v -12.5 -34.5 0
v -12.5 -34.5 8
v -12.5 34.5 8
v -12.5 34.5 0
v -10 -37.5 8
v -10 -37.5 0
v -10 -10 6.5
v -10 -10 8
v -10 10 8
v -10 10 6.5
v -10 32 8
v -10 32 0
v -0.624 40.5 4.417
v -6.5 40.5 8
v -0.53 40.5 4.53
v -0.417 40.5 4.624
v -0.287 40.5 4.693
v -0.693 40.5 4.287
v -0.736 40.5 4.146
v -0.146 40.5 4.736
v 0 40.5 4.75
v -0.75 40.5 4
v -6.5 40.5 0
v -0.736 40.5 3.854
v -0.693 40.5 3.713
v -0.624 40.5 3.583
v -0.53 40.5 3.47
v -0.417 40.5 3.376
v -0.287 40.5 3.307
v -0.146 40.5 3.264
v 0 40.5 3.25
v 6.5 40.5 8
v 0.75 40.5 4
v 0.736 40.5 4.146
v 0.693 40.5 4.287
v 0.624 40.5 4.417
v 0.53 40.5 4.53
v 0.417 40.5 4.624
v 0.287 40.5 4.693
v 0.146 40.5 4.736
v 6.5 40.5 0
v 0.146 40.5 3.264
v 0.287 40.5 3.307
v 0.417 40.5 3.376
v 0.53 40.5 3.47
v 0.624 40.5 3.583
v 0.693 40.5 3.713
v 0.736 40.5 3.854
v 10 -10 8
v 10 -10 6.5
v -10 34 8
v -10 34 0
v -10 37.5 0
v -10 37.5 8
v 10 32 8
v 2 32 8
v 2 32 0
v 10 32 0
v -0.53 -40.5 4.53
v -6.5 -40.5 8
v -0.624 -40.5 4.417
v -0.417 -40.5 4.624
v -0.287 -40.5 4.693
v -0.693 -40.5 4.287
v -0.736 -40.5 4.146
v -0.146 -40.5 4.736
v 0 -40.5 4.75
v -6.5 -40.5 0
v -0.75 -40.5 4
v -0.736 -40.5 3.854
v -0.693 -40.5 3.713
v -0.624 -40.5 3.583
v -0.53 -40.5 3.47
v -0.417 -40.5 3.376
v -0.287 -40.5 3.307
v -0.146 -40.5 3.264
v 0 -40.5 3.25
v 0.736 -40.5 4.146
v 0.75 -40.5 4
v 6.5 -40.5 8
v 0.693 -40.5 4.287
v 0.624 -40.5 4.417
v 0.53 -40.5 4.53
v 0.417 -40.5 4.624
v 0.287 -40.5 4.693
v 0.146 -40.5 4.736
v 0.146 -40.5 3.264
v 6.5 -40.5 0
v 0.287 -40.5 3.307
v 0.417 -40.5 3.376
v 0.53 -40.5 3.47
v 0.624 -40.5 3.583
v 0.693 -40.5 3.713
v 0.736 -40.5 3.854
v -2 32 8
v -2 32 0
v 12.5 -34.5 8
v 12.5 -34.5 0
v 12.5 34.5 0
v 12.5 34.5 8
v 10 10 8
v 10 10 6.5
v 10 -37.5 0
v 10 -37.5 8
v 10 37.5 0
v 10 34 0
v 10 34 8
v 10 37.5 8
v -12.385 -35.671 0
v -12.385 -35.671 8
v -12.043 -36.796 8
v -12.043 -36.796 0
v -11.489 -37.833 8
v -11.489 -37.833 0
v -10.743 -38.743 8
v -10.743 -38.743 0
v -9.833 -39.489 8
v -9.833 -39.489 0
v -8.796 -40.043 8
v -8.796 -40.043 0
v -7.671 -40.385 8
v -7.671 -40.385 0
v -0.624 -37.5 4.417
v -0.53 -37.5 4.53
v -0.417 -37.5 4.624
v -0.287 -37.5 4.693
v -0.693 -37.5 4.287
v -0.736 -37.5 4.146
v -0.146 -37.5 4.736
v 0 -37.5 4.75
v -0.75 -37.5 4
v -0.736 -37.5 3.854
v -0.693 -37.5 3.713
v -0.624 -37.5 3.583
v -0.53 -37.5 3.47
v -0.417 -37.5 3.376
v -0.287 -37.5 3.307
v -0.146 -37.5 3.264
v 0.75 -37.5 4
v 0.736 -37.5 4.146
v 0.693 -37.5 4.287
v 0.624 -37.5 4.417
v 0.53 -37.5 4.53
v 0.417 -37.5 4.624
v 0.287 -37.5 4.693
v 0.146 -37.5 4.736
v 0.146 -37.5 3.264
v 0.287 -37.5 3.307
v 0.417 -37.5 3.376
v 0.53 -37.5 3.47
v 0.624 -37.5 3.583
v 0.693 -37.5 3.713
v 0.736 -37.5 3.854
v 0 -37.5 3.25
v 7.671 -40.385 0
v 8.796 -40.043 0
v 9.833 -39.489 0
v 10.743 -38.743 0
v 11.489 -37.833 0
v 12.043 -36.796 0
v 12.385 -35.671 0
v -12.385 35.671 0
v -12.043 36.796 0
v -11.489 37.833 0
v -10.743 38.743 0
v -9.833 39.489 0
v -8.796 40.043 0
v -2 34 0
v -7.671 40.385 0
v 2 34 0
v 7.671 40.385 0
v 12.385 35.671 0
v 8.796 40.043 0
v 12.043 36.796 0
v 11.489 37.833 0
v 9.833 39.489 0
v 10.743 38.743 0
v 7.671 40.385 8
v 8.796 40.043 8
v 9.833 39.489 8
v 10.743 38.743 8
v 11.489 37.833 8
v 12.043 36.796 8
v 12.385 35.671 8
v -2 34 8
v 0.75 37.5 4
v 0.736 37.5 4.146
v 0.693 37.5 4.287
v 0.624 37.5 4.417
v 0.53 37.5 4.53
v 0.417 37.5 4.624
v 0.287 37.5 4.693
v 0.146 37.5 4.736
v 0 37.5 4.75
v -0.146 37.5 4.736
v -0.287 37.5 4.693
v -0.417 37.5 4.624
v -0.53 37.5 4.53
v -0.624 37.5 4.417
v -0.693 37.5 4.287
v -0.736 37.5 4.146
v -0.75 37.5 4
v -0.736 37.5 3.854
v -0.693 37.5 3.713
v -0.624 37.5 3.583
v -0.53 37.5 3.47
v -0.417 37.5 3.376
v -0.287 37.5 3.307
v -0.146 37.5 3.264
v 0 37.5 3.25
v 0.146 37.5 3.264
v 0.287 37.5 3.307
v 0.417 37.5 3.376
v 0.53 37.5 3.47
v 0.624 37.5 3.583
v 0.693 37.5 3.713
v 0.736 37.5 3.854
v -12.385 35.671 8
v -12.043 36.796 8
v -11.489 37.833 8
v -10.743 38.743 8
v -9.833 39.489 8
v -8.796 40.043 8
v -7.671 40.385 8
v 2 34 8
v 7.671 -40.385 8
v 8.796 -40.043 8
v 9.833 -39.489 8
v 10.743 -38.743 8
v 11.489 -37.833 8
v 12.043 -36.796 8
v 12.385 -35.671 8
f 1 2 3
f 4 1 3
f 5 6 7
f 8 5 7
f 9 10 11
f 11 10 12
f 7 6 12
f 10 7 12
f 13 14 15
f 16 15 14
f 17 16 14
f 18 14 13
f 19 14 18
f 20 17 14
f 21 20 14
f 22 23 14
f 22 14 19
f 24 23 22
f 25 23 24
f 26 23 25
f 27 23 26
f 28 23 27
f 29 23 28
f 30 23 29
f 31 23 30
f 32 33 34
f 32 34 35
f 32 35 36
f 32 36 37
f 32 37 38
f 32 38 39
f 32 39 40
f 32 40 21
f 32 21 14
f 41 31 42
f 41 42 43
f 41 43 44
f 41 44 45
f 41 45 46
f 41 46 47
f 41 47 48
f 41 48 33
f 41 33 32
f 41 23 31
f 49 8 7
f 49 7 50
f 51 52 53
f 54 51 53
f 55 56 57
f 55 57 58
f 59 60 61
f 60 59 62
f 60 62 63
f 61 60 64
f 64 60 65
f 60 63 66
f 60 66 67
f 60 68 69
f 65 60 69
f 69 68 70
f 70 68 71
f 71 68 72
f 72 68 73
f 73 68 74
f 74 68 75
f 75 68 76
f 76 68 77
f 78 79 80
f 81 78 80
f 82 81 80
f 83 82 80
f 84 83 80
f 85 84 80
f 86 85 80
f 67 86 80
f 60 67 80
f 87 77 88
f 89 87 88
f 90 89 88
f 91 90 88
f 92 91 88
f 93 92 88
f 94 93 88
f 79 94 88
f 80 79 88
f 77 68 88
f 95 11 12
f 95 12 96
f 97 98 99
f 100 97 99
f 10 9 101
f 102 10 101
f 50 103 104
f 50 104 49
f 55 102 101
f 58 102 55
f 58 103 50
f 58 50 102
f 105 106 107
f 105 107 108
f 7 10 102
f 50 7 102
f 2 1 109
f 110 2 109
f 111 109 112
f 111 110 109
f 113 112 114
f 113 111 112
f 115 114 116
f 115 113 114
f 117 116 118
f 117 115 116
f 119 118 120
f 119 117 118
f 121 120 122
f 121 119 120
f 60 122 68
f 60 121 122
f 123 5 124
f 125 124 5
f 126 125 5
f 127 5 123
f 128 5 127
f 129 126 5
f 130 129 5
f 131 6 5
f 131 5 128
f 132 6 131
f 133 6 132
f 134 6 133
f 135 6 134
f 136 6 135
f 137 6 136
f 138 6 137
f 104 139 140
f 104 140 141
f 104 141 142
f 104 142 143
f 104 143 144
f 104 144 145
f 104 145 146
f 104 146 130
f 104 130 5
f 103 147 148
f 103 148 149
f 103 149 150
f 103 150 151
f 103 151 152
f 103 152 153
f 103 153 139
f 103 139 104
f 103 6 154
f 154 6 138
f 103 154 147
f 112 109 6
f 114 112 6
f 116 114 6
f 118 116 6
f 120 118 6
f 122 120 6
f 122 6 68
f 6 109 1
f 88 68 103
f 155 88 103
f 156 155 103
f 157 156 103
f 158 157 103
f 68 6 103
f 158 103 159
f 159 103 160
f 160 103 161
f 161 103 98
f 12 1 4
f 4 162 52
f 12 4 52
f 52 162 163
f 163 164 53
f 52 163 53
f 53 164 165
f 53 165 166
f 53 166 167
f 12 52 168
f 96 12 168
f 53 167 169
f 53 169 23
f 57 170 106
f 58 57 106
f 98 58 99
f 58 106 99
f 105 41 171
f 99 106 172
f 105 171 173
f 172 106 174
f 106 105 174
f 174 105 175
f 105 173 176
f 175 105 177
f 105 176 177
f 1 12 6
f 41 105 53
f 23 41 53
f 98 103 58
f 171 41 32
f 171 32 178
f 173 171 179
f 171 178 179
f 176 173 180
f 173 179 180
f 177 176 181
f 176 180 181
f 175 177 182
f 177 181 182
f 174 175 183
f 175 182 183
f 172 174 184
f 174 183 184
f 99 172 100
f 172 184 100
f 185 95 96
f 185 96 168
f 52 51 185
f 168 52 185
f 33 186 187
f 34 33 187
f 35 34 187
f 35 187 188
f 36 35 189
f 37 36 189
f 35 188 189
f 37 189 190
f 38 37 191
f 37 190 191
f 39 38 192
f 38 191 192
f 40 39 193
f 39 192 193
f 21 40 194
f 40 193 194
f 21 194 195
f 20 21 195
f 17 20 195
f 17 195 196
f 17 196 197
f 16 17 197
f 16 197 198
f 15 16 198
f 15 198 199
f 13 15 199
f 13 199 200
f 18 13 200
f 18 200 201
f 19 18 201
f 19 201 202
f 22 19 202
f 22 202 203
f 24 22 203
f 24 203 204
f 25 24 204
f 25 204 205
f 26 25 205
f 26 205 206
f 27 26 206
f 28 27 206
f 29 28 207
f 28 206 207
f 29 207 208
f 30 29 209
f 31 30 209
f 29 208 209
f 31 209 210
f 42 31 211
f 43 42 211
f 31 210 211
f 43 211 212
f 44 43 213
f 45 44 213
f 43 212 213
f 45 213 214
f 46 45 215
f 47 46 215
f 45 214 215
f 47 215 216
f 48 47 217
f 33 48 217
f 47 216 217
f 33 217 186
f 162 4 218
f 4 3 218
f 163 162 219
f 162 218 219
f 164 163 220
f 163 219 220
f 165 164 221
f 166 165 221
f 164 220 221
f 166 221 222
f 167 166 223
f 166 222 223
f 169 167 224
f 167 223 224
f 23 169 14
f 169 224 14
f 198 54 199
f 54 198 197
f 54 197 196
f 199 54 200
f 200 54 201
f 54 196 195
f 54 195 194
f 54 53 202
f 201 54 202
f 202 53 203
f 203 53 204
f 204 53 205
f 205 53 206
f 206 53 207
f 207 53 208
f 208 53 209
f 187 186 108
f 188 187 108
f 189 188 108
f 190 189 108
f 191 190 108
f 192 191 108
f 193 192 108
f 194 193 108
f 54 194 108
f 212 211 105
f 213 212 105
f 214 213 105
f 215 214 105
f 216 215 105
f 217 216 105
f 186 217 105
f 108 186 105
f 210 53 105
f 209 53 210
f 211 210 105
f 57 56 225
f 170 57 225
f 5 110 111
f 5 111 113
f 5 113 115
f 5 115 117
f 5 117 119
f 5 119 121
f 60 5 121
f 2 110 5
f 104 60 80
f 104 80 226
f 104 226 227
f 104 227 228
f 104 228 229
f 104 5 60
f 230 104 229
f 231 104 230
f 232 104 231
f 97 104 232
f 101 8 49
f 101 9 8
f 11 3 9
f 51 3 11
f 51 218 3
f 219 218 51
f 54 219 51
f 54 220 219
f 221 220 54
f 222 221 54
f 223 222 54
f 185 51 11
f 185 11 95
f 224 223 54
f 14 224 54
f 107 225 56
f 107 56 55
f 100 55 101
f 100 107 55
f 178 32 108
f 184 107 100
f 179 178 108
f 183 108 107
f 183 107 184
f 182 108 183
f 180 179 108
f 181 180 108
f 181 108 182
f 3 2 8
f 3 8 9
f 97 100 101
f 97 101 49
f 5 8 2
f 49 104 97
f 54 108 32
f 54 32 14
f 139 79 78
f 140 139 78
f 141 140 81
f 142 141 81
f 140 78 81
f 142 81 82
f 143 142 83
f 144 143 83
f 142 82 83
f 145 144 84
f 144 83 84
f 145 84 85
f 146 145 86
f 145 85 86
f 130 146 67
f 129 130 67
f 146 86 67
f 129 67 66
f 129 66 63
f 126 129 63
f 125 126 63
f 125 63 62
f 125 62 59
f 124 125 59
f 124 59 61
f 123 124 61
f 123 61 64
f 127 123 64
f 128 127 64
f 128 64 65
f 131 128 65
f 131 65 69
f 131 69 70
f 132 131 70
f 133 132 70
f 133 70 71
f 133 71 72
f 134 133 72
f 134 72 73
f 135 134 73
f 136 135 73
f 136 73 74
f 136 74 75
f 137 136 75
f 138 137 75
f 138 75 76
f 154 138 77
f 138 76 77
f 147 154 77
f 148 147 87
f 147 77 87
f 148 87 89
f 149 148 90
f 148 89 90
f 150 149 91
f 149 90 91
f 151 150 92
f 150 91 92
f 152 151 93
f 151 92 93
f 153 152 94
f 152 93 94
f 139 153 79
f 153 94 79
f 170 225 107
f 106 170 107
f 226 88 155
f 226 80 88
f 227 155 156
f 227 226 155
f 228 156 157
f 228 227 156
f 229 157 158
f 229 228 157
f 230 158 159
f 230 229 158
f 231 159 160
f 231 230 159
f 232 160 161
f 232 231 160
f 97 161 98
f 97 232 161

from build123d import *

# Parameters (mm, degrees)
F0_W     = 25
F0_H     = 81
F0_W_2   = 20
F0_H_2   = 75
F1_DEPTH = 8
F2_W     = 8
F2_H     = 2
F3_DEPTH = 8
F5_R     = 6
F6_W     = 22.5
F6_H     = 20
F7_DEPTH = 1.5
F8_R     = 0.75
F9_DEPTH = 100


with BuildPart() as f1:
    # F0 (on Top) → F1 (new body)
    with BuildSketch(Plane.XY):
        Rectangle(F0_W, F0_H)
        Rectangle(F0_W_2, F0_H_2, mode=Mode.SUBTRACT)
    extrude(amount=F1_DEPTH)

    # F2 (on face) → F3 (join)
    with BuildSketch(Plane.XY.offset(8)):
        with Locations((-6, 33)):
            Rectangle(F2_W, F2_H)
        with Locations((6, 33)):
            Rectangle(F2_W, F2_H)
    extrude(amount=-F3_DEPTH)

    # F5
    f5_edges = [f1.edges().sort_by_distance(p)[0] for p in [
        (-12.5, 40.5, 4),
        (12.5, 40.5, 4),
        (12.5, -40.5, 4),
        (-12.5, -40.5, 4),
    ]]
    fillet(f5_edges, radius=F5_R)

    # F6 (on face) → F7 (join)
    with BuildSketch(Plane.XY.offset(8)):
        with Locations((-1.25, 0)):
            Rectangle(F6_W, F6_H)
    extrude(amount=-F7_DEPTH)

    # F8 (on face) → F9 (cut)
    with BuildSketch(Plane.XZ.offset(40.5)):
        with Locations((0, 4)):
            Circle(F8_R)
    extrude(amount=-F9_DEPTH, mode=Mode.SUBTRACT)


solid = f1.part
